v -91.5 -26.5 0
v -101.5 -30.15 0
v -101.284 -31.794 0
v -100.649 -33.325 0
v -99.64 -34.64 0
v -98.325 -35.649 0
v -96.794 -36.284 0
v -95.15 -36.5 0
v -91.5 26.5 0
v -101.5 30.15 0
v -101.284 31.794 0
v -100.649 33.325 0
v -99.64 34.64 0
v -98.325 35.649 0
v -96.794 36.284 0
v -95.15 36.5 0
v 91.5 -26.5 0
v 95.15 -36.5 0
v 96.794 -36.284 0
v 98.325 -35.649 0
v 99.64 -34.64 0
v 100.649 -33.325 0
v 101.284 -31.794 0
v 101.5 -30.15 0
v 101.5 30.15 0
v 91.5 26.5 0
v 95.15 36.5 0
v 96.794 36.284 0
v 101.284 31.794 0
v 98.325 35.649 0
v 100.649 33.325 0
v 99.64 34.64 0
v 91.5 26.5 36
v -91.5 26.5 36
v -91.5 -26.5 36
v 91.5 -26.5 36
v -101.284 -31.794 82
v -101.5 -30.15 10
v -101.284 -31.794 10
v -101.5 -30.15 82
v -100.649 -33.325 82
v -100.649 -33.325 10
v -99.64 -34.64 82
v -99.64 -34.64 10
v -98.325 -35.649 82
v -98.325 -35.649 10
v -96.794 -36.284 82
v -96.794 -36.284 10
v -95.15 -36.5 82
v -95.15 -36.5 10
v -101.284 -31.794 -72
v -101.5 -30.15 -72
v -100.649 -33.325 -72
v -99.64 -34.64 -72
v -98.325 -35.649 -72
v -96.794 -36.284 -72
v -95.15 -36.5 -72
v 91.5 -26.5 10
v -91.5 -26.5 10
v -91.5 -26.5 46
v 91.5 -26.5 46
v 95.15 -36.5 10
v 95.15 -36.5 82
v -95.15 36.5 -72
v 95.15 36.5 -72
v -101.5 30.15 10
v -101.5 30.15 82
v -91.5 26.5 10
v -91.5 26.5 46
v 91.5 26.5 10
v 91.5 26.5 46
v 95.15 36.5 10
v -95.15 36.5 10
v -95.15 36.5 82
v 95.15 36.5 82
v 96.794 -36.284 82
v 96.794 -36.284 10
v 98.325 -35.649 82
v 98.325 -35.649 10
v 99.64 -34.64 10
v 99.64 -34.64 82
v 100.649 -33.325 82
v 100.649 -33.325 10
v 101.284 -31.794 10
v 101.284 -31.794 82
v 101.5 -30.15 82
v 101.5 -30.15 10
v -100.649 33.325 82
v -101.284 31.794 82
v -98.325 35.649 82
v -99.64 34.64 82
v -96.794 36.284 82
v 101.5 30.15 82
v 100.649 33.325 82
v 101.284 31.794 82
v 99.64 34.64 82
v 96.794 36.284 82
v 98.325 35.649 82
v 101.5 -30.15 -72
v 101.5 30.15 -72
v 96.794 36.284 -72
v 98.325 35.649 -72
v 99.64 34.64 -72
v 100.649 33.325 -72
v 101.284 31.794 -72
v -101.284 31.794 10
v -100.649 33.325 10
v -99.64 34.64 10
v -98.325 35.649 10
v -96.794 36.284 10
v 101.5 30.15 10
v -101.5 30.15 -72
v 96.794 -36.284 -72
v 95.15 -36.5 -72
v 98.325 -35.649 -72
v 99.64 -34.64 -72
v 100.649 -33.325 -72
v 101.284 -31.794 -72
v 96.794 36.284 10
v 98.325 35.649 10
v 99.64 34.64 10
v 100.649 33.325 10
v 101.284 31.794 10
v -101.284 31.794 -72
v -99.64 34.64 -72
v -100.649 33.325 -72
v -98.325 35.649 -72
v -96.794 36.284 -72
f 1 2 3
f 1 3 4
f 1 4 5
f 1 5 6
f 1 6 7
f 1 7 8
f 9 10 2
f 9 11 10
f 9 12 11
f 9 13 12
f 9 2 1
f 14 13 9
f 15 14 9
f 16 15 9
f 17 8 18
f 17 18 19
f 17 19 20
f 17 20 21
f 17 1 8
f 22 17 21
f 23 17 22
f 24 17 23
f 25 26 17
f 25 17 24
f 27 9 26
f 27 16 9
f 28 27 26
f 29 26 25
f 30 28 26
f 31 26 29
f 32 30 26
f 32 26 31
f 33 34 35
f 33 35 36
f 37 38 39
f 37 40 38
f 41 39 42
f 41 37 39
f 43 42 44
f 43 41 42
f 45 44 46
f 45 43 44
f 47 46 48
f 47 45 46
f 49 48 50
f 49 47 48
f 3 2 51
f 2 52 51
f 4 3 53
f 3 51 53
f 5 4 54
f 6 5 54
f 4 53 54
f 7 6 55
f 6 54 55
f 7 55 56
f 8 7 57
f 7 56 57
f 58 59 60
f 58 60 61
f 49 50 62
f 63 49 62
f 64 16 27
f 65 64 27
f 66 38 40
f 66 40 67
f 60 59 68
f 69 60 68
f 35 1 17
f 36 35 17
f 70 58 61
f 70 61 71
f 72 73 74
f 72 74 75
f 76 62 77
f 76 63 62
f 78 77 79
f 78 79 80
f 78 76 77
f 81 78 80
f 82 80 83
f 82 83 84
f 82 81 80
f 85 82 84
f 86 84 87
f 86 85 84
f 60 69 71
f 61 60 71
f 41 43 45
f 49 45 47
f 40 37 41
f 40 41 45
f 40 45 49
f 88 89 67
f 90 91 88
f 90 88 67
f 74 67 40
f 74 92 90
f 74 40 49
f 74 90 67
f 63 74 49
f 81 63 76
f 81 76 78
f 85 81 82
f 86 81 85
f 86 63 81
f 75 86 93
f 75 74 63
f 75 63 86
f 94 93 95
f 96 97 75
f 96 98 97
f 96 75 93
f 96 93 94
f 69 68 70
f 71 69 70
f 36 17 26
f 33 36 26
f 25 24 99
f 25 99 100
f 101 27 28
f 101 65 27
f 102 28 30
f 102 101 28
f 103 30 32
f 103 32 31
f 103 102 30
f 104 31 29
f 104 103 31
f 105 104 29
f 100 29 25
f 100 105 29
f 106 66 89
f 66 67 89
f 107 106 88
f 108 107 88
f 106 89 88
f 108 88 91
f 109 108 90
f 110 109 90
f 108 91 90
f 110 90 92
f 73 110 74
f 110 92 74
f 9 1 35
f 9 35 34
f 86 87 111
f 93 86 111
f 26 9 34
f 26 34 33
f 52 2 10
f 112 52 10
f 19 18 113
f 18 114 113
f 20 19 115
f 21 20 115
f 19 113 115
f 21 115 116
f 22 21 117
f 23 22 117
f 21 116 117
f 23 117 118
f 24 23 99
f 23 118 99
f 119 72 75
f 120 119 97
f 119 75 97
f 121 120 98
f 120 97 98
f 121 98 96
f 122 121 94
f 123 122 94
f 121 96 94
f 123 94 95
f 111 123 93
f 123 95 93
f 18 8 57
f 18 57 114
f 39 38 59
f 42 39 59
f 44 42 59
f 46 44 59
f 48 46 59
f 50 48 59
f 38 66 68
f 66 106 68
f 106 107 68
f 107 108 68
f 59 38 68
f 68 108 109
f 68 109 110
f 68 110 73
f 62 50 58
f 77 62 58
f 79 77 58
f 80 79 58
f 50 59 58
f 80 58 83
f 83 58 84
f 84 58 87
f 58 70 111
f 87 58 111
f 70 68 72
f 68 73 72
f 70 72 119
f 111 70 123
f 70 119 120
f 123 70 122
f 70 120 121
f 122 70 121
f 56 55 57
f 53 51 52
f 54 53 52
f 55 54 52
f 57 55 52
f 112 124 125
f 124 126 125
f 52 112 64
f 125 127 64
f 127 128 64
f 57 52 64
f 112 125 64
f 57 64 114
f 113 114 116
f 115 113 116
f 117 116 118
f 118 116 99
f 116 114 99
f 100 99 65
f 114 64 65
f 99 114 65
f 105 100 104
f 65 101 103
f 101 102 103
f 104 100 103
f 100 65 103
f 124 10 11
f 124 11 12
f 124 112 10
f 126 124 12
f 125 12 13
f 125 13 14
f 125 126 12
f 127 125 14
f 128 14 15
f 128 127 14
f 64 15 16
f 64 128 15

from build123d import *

# Parameters (mm, degrees)
F0_W     = 203
F0_H     = 73
F0_W_2   = 183
F0_H_2   = 53
F1_DEPTH = 72
F2_DEPTH = 36
F4_W     = 203
F4_H     = 73
F4_W_2   = 183
F4_H_2   = 53
F5_DEPTH = 72
F6_DEPTH = 36
F7_R     = 6.35
F7_2_R   = 6.35


with BuildPart() as f1:
    # F0 (on Top) → F1 (new body)
    with BuildSketch(Plane.XY):
        Rectangle(F0_W, F0_H)
        Rectangle(F0_W_2, F0_H_2, mode=Mode.SUBTRACT)
        Rectangle(F0_W_2, F0_H_2)
    extrude(amount=-F1_DEPTH)

    # F0 (on Top) → F2 (join)
    with BuildSketch(Plane.XY):
        Rectangle(F0_W_2, F0_H_2)
    extrude(amount=F2_DEPTH)

    # F7#2
    f7_2_edges = [f1.edges().sort_by_distance(p)[0] for p in [
        (101.5, 36.5, -36),
        (101.5, -36.5, -36),
        (-101.5, 36.5, -36),
        (-101.5, -36.5, -36),
    ]]
    fillet(f7_2_edges, radius=F7_2_R)


with BuildPart() as f5:
    # F4 (on offset) → F5 (new body)
    with BuildSketch(Plane.XY.offset(10)):
        Rectangle(F4_W, F4_H)
        Rectangle(F4_W_2, F4_H_2, mode=Mode.SUBTRACT)
        Rectangle(F4_W_2, F4_H_2)
    extrude(amount=F5_DEPTH)

    # F4 (on offset) → F6 (cut)
    with BuildSketch(Plane.XY.offset(10)):
        Rectangle(F4_W_2, F4_H_2)
    extrude(amount=F6_DEPTH, mode=Mode.SUBTRACT)

    # F7
    f7_edges = [f5.edges().sort_by_distance(p)[0] for p in [
        (101.5, 36.5, 46),
        (101.5, -36.5, 46),
        (-101.5, 36.5, 46),
        (-101.5, -36.5, 46),
    ]]
    fillet(f7_edges, radius=F7_R)


solid = Compound([f1.part, f5.part])
